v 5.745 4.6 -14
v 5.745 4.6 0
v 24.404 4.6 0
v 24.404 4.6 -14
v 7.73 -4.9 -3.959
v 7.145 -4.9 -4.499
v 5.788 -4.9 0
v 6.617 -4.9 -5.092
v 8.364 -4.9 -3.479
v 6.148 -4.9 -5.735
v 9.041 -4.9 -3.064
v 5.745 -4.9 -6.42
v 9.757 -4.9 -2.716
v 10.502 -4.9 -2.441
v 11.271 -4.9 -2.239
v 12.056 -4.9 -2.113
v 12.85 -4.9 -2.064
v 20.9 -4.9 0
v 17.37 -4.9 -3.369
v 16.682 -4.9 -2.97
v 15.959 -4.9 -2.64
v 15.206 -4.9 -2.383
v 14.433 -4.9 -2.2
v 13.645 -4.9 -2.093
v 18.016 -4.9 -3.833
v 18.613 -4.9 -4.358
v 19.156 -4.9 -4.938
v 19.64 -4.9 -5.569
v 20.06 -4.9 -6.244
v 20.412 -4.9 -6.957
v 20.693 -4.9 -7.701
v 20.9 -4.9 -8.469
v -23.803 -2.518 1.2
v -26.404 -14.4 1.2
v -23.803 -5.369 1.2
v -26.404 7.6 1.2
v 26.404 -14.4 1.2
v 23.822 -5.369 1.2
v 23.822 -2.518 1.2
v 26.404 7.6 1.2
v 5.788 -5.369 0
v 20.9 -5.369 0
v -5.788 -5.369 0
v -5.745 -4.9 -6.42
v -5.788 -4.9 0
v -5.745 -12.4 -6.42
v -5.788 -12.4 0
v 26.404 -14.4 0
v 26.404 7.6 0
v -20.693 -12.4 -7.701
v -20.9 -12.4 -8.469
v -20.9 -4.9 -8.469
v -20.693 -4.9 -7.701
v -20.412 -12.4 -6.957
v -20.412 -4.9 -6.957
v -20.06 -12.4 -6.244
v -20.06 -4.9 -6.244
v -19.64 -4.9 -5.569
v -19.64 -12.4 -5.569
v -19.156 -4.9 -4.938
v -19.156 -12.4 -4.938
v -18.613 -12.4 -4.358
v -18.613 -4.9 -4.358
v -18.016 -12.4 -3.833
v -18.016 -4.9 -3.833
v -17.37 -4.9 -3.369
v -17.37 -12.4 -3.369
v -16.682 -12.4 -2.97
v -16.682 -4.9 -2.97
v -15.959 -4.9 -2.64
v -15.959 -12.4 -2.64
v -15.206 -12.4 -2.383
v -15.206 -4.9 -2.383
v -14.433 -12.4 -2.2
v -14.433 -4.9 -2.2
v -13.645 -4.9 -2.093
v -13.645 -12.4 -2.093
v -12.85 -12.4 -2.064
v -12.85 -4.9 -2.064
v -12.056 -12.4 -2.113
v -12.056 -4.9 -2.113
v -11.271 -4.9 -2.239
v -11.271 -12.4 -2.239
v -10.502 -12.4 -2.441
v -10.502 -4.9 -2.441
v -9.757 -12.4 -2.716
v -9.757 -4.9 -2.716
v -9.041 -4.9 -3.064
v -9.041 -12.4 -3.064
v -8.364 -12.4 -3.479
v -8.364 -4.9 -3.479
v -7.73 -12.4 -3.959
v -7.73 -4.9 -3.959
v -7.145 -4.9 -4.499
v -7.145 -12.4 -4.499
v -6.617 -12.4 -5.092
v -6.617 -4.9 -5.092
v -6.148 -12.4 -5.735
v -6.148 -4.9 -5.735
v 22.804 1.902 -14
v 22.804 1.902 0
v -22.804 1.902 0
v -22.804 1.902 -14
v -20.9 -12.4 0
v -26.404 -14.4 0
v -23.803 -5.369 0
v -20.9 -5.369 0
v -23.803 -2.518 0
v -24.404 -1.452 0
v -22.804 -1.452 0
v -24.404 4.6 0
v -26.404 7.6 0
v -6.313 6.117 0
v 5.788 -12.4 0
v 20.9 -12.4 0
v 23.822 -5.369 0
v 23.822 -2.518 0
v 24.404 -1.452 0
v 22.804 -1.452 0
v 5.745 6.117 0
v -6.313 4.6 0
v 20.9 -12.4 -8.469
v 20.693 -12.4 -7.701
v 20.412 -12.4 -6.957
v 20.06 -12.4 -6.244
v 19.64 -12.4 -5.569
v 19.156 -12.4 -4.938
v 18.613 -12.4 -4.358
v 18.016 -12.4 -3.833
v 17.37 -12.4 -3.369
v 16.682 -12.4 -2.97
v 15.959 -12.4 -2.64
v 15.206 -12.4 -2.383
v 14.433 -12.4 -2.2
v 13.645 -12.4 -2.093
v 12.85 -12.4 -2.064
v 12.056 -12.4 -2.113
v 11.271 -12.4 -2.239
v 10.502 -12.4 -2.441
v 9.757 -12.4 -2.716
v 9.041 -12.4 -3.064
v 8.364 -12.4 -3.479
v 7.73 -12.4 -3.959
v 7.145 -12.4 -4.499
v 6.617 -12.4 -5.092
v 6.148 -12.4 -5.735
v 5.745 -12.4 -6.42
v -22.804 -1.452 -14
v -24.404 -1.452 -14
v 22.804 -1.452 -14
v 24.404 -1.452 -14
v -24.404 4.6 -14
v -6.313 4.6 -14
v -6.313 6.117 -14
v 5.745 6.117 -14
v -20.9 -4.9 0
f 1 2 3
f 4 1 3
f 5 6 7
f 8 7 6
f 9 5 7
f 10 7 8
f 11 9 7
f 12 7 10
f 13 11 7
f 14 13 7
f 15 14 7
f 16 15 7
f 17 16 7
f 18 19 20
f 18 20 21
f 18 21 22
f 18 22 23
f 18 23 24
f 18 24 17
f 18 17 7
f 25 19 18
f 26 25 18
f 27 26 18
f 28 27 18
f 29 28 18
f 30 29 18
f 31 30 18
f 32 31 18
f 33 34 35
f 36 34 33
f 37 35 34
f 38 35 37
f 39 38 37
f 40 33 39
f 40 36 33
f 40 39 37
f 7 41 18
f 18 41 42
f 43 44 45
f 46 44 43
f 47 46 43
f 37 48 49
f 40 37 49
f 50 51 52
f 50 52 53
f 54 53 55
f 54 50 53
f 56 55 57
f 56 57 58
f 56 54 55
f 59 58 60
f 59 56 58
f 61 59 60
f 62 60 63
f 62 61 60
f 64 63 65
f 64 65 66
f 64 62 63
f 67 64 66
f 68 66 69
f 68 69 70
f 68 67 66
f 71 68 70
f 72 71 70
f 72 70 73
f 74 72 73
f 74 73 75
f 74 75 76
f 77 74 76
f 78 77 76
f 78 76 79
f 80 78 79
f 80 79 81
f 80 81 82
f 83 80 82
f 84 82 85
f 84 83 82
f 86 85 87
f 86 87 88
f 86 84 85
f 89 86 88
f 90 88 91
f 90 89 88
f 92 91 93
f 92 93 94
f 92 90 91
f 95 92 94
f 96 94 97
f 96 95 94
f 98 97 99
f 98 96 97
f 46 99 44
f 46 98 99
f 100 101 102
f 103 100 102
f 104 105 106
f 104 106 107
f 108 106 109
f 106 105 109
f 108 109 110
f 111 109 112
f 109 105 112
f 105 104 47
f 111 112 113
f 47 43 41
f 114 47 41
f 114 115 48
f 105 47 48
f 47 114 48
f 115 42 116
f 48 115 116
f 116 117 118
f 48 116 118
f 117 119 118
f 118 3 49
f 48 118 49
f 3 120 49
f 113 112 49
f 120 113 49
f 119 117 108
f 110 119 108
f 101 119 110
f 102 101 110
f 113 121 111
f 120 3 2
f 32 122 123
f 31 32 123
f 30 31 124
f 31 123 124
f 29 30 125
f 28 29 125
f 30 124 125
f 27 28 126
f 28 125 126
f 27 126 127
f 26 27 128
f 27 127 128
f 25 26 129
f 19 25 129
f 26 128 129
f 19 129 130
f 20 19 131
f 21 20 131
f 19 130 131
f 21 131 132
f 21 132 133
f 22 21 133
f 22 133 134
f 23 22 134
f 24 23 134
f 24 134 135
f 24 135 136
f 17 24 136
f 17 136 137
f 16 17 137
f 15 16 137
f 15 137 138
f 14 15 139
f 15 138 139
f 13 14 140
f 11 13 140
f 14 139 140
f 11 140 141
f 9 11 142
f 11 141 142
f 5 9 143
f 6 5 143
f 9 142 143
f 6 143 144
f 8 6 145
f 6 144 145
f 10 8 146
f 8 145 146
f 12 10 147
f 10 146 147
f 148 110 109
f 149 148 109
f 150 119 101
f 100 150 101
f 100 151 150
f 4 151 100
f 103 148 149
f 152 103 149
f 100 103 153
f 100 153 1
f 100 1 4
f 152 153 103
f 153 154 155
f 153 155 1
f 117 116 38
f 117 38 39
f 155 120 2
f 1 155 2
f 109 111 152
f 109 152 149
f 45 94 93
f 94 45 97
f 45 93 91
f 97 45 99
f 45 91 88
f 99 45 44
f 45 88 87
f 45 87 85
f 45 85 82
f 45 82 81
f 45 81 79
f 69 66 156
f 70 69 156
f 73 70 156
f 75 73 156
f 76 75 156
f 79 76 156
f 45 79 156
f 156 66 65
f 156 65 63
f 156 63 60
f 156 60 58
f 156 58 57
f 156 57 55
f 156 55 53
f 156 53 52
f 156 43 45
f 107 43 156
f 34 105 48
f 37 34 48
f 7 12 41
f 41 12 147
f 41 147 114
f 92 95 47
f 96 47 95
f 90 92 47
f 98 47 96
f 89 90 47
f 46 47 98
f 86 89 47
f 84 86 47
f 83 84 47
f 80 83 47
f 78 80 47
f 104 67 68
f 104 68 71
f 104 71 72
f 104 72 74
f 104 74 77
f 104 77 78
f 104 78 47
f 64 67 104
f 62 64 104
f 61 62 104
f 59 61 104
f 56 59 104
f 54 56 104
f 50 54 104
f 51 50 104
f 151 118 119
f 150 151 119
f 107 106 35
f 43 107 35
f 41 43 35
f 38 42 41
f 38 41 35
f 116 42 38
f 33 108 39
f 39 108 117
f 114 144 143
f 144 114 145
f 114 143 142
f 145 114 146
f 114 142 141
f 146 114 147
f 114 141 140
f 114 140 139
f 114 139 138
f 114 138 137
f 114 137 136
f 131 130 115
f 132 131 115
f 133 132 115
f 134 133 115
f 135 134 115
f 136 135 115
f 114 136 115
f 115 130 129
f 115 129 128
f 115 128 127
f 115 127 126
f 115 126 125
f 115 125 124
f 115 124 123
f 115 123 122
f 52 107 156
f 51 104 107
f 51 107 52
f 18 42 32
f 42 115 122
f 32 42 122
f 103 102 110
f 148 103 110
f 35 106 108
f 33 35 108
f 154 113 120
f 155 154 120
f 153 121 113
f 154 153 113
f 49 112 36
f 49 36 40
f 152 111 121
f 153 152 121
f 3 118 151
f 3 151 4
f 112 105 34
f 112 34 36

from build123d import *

# Parameters (mm, degrees)
SALIENTE_EXTRUIR1_DEPTH   = 7.5
SALIENTE_EXTRUIR1_2_DEPTH = 7.5
SALIENTE_EXTRUIR2_DEPTH   = 14
CROQUIS4_W                = 52.808095268
CROQUIS4_H                = 22
CROQUIS4_W_2              = 47.625032345
CROQUIS4_H_2              = 2.85152228
SALIENTE_EXTRUIR3_DEPTH   = 1.2


with BuildPart() as part:
    # Croquis2 → Saliente-Extruir1 (new body)
    with BuildSketch(Plane(origin=(0, -12.4, 0), x_dir=(1, 0, 0), z_dir=(0, 1, 0))):
        with BuildLine():
            Line((20.9, 0), (20.9, 8.468551509))
            ThreePointArc((20.9, 8.468551509), (14.039862076, 2.13695997), (5.744958612, 6.420080362))
            Line((5.744958612, 6.420080362), (5.788277469, 0))
            Line((5.788277469, 0), (20.9, 0))
        make_face()
    extrude(amount=SALIENTE_EXTRUIR1_DEPTH)



with BuildPart() as body_2:
    # Croquis2 → Saliente-Extruir1 2 (new body)
    with BuildSketch(Plane(origin=(0, -12.4, 0), x_dir=(1, 0, 0), z_dir=(0, 1, 0))):
        with BuildLine():
            ThreePointArc((-20.9, 8.468551509), (-14.039862076, 2.13695997), (-5.744958612, 6.420080362))
            Line((-5.744958612, 6.420080362), (-5.788277469, 0))
            Line((-5.788277469, 0), (-20.9, 0))
            Line((-20.9, 0), (-20.9, 8.468551509))
        make_face()
    extrude(amount=SALIENTE_EXTRUIR1_2_DEPTH)


with BuildPart() as body_3:
    # Croquis3 → Saliente-Extruir2 (new body)
    with BuildSketch(Plane.XY):
        Polygon((24.404047634, 4.6), (24.404047634, 1.902402318), (24.404047634, -1.452453504), (22.804047634, -1.452453504), (22.804047634, 1.902402318), (-22.804047634, 1.902402318), (-22.804047634, -1.452453504), (-24.404047634, -1.452453504), (-24.404047634, 1.902402318), (-24.404047634, 4.6), (-6.312940469, 4.6), (-6.312940469, 6.117496706), (5.744958612, 6.117496706), (5.744958612, 4.6), align=None)
    extrude(amount=-SALIENTE_EXTRUIR2_DEPTH)


with BuildPart() as part_1:
    add(part.part)

    add(body_2.part)  # Saliente-Extruir3 merges body 2

    add(body_3.part)  # Saliente-Extruir3 merges body 3
    # Croquis4 → Saliente-Extruir3 (add)
    with BuildSketch(Plane.XY):
        with Locations((0, -3.4)):
            Rectangle(CROQUIS4_W, CROQUIS4_H)
        with Locations((0.009244494, -3.943262508)):
            Rectangle(CROQUIS4_W_2, CROQUIS4_H_2, mode=Mode.SUBTRACT)
    extrude(amount=SALIENTE_EXTRUIR3_DEPTH)


solid = part_1.part
